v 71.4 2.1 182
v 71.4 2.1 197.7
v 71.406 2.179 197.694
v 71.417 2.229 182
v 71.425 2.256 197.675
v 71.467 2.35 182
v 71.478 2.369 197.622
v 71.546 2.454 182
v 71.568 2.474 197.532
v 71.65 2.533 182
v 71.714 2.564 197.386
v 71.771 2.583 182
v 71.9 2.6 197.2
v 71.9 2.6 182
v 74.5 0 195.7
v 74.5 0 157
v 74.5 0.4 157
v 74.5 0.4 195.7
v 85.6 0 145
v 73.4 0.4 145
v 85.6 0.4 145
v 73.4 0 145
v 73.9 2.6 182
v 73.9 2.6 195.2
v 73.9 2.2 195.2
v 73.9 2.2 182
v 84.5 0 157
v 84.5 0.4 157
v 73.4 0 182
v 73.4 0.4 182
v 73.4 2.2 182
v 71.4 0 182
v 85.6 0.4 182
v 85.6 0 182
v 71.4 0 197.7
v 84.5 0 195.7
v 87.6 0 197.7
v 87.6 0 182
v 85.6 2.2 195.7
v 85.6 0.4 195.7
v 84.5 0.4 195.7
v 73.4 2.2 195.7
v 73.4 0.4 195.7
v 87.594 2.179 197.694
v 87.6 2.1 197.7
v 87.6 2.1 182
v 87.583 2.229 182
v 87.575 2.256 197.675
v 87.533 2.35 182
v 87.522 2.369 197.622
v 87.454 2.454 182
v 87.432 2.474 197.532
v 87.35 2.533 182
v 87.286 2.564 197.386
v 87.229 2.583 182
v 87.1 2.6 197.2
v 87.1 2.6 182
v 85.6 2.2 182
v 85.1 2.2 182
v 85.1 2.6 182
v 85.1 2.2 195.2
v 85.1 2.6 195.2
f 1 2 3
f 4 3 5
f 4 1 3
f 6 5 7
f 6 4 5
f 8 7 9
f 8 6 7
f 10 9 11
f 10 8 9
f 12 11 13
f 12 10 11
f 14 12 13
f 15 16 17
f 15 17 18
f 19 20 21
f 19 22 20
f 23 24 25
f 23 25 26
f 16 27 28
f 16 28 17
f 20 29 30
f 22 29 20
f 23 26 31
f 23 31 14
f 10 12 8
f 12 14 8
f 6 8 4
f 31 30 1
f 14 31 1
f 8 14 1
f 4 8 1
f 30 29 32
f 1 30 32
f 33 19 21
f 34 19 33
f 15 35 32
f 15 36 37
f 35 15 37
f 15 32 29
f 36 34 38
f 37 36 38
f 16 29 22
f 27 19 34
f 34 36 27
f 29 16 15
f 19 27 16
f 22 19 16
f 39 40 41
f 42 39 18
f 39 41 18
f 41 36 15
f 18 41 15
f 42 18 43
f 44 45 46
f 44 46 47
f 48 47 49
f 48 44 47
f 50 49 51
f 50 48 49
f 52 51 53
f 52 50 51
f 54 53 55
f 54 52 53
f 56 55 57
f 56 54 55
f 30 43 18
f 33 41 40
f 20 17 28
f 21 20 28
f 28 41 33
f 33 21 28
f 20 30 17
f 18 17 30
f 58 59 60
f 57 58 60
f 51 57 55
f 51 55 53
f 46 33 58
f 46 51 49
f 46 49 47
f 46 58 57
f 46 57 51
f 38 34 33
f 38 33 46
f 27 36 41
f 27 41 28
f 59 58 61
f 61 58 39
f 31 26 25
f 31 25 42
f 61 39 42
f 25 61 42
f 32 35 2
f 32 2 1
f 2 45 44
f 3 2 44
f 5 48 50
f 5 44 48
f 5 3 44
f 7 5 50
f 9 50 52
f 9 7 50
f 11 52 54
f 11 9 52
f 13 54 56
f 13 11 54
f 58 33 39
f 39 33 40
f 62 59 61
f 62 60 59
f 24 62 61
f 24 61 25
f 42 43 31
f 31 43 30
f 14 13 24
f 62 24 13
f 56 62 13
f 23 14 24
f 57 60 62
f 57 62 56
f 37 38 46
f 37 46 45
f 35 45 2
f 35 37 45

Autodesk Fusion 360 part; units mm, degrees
sketch "snippy-Edge_Cuts" plane through (0, 0, 0) normal (0, 1, 0) x (1, 0, 0)
  line L0 (73.4, -145) -> (85.6, -145)
  line L1 (85.6, -145) -> (85.6, -157)
  line L2 (85.6, -157) -> (73.4, -157)
  line L3 (73.4, -157) -> (73.4, -145)
  line L4 (73.4, -145) -> (73.4, -157)
  line L5 (73.4, -157) -> (85.6, -157)
  line L6 (85.6, -157) -> (85.6, -195.7)
  line L7 (85.6, -195.7) -> (73.4, -195.7)
  line L8 (73.4, -195.7) -> (73.4, -157)
  line L9 (87.6, -182) -> (87.6, -197.7)
  line L10 (87.6, -197.7) -> (71.4, -197.7)
  line L11 (71.4, -197.7) -> (71.4, -182)
  line L12 (73.4, -157) -> (85.6, -157)
  line L13 (84.5, -157) -> (74.5, -157)
  line L14 (74.5, -157) -> (74.5, -195.7)
  line L15 (74.5, -195.7) -> (84.5, -195.7)
  line L16 (84.5, -195.7) -> (84.5, -157)
  line L17 (85.6, -157) -> (85.6, -182)
  line L18 (85.6, -182) -> (87.6, -182)
  line L19 (87.6, -182) -> (71.4, -182)
  dimension "d4" = 12
  dimension "d8" = 12.2
  dimension "d9" = 12.2
  dimension "d23" = 10
  dimension "d25" = 1.1
  dimension "d26" = 1.1
extrude "Extrude6" add sketch "snippy-Edge_Cuts" along normal blind 0.4 contours L0 L1 L2 L3 L4 L5 L12 L13 | L2 L5 L8 L12 L14 L19 | L2 L5 L6 L12 L16 L17 L19 | L7 L8 L14 L19 | L6 L7 L8 L9 L10 L11 L15 L18 L19 | L6 L7 L16 L19 makes body 1
extrude "Extrude7" cut sketch "snippy-Edge_Cuts" along normal blind 2.6 contours L6 L7 L8 L9 L10 L11 L15 L18 L19 bodies 1
extrude "Extrude8" add sketch "snippy-Edge_Cuts" along normal blind 2.2 contours L6 L7 L8 L9 L10 L11 L15 L18 L19 bodies 1
extrude "Extrude9" add 1 faces at (77.4667, 2.2, 197.0333) along direction (0, 1, 0) blind 0.4 separate body on bodies 1 makes body 2
sketch "Sketch6" plane through (0, 2.6, 0) normal (0, 1, 0) x (-1, 0, 0)
  line L0 (-87.6, 197.7) -> (-87.6, 182)
  line L1 (-87.6, 182) -> (-85.6, 182)
  line L2 (-85.6, 182) -> (-85.6, 195.7)
  line L3 (-85.6, 195.7) -> (-73.4, 195.7)
  line L4 (-73.4, 195.7) -> (-73.4, 182)
  line L5 (-73.4, 182) -> (-71.4, 182)
  line L6 (-71.4, 182) -> (-71.4, 197.7)
  line L7 (-71.4, 197.7) -> (-87.6, 197.7)
  line L8 (-85.1, 182) -> (-85.1, 195.2)
  line L9 (-85.1, 195.2) -> (-73.9, 195.2)
  line L10 (-73.9, 195.2) -> (-73.9, 182)
  line L11 (-85.1, 182) -> (-85.6, 182)
  line L12 (-85.6, 182) -> (-85.6, 195.7)
  line L13 (-85.6, 195.7) -> (-73.4, 195.7)
  line L14 (-73.4, 195.7) -> (-73.4, 182)
  line L15 (-73.4, 182) -> (-73.9, 182)
  dimension "d40" = 0.5
extrude "Extrude10" add sketch "Sketch6" against normal blind 0.4 contours L2 L3 L4 L8 L9 L10 L11 L12 L13 L14 L15 bodies 1 2
fillet "Fillet2" radius 0.5 3 edges at (87.6, 2.6, 189.85) (79.5, 2.6, 197.7) (71.4, 2.6, 189.85) on bodies 1
sketch "Sketch3" plane through (0, 2.6, 0) normal (0, 1, 0) x (-1, 0, 0)
  line L0 (-85.6, 195.7) -> (-85.6, 157)
  line L1 (-73.4, 195.7) -> (-85.6, 195.7)
  line L2 (-73.4, 157) -> (-73.4, 195.7)
  line L3 (-85.6, 157) -> (-73.4, 157)
  line L4 (-85.1, 195.7) -> (-85.6, 195.7)
  line L5 (-73.9, 157) -> (-85.6, 157)
  line L6 (-85.6, 157) -> (-73.4, 157)
  line L7 (-73.4, 157) -> (-73.4, 195.7)
  line L8 (-73.4, 195.7) -> (-85.6, 195.7)
  line L9 (-73.9, 157) -> (-73.9, 195.2)
  line L10 (-73.9, 195.2) -> (-85.1, 195.2)
  line L11 (-85.1, 195.2) -> (-85.1, 157)
  dimension "d17" = 0.5
sketch "Sketch4" plane through (0, 0.4, 0) normal (0, 1, 0) x (-1, 0, 0)
  line L0 (-73.4, 145) -> (-73.4, 195.7)
  line L1 (-85.6, 195.7) -> (-85.6, 145)
  line L2 (-85.6, 145) -> (-73.4, 145)
  line L3 (-73.4, 195.7) -> (-85.6, 195.7)
